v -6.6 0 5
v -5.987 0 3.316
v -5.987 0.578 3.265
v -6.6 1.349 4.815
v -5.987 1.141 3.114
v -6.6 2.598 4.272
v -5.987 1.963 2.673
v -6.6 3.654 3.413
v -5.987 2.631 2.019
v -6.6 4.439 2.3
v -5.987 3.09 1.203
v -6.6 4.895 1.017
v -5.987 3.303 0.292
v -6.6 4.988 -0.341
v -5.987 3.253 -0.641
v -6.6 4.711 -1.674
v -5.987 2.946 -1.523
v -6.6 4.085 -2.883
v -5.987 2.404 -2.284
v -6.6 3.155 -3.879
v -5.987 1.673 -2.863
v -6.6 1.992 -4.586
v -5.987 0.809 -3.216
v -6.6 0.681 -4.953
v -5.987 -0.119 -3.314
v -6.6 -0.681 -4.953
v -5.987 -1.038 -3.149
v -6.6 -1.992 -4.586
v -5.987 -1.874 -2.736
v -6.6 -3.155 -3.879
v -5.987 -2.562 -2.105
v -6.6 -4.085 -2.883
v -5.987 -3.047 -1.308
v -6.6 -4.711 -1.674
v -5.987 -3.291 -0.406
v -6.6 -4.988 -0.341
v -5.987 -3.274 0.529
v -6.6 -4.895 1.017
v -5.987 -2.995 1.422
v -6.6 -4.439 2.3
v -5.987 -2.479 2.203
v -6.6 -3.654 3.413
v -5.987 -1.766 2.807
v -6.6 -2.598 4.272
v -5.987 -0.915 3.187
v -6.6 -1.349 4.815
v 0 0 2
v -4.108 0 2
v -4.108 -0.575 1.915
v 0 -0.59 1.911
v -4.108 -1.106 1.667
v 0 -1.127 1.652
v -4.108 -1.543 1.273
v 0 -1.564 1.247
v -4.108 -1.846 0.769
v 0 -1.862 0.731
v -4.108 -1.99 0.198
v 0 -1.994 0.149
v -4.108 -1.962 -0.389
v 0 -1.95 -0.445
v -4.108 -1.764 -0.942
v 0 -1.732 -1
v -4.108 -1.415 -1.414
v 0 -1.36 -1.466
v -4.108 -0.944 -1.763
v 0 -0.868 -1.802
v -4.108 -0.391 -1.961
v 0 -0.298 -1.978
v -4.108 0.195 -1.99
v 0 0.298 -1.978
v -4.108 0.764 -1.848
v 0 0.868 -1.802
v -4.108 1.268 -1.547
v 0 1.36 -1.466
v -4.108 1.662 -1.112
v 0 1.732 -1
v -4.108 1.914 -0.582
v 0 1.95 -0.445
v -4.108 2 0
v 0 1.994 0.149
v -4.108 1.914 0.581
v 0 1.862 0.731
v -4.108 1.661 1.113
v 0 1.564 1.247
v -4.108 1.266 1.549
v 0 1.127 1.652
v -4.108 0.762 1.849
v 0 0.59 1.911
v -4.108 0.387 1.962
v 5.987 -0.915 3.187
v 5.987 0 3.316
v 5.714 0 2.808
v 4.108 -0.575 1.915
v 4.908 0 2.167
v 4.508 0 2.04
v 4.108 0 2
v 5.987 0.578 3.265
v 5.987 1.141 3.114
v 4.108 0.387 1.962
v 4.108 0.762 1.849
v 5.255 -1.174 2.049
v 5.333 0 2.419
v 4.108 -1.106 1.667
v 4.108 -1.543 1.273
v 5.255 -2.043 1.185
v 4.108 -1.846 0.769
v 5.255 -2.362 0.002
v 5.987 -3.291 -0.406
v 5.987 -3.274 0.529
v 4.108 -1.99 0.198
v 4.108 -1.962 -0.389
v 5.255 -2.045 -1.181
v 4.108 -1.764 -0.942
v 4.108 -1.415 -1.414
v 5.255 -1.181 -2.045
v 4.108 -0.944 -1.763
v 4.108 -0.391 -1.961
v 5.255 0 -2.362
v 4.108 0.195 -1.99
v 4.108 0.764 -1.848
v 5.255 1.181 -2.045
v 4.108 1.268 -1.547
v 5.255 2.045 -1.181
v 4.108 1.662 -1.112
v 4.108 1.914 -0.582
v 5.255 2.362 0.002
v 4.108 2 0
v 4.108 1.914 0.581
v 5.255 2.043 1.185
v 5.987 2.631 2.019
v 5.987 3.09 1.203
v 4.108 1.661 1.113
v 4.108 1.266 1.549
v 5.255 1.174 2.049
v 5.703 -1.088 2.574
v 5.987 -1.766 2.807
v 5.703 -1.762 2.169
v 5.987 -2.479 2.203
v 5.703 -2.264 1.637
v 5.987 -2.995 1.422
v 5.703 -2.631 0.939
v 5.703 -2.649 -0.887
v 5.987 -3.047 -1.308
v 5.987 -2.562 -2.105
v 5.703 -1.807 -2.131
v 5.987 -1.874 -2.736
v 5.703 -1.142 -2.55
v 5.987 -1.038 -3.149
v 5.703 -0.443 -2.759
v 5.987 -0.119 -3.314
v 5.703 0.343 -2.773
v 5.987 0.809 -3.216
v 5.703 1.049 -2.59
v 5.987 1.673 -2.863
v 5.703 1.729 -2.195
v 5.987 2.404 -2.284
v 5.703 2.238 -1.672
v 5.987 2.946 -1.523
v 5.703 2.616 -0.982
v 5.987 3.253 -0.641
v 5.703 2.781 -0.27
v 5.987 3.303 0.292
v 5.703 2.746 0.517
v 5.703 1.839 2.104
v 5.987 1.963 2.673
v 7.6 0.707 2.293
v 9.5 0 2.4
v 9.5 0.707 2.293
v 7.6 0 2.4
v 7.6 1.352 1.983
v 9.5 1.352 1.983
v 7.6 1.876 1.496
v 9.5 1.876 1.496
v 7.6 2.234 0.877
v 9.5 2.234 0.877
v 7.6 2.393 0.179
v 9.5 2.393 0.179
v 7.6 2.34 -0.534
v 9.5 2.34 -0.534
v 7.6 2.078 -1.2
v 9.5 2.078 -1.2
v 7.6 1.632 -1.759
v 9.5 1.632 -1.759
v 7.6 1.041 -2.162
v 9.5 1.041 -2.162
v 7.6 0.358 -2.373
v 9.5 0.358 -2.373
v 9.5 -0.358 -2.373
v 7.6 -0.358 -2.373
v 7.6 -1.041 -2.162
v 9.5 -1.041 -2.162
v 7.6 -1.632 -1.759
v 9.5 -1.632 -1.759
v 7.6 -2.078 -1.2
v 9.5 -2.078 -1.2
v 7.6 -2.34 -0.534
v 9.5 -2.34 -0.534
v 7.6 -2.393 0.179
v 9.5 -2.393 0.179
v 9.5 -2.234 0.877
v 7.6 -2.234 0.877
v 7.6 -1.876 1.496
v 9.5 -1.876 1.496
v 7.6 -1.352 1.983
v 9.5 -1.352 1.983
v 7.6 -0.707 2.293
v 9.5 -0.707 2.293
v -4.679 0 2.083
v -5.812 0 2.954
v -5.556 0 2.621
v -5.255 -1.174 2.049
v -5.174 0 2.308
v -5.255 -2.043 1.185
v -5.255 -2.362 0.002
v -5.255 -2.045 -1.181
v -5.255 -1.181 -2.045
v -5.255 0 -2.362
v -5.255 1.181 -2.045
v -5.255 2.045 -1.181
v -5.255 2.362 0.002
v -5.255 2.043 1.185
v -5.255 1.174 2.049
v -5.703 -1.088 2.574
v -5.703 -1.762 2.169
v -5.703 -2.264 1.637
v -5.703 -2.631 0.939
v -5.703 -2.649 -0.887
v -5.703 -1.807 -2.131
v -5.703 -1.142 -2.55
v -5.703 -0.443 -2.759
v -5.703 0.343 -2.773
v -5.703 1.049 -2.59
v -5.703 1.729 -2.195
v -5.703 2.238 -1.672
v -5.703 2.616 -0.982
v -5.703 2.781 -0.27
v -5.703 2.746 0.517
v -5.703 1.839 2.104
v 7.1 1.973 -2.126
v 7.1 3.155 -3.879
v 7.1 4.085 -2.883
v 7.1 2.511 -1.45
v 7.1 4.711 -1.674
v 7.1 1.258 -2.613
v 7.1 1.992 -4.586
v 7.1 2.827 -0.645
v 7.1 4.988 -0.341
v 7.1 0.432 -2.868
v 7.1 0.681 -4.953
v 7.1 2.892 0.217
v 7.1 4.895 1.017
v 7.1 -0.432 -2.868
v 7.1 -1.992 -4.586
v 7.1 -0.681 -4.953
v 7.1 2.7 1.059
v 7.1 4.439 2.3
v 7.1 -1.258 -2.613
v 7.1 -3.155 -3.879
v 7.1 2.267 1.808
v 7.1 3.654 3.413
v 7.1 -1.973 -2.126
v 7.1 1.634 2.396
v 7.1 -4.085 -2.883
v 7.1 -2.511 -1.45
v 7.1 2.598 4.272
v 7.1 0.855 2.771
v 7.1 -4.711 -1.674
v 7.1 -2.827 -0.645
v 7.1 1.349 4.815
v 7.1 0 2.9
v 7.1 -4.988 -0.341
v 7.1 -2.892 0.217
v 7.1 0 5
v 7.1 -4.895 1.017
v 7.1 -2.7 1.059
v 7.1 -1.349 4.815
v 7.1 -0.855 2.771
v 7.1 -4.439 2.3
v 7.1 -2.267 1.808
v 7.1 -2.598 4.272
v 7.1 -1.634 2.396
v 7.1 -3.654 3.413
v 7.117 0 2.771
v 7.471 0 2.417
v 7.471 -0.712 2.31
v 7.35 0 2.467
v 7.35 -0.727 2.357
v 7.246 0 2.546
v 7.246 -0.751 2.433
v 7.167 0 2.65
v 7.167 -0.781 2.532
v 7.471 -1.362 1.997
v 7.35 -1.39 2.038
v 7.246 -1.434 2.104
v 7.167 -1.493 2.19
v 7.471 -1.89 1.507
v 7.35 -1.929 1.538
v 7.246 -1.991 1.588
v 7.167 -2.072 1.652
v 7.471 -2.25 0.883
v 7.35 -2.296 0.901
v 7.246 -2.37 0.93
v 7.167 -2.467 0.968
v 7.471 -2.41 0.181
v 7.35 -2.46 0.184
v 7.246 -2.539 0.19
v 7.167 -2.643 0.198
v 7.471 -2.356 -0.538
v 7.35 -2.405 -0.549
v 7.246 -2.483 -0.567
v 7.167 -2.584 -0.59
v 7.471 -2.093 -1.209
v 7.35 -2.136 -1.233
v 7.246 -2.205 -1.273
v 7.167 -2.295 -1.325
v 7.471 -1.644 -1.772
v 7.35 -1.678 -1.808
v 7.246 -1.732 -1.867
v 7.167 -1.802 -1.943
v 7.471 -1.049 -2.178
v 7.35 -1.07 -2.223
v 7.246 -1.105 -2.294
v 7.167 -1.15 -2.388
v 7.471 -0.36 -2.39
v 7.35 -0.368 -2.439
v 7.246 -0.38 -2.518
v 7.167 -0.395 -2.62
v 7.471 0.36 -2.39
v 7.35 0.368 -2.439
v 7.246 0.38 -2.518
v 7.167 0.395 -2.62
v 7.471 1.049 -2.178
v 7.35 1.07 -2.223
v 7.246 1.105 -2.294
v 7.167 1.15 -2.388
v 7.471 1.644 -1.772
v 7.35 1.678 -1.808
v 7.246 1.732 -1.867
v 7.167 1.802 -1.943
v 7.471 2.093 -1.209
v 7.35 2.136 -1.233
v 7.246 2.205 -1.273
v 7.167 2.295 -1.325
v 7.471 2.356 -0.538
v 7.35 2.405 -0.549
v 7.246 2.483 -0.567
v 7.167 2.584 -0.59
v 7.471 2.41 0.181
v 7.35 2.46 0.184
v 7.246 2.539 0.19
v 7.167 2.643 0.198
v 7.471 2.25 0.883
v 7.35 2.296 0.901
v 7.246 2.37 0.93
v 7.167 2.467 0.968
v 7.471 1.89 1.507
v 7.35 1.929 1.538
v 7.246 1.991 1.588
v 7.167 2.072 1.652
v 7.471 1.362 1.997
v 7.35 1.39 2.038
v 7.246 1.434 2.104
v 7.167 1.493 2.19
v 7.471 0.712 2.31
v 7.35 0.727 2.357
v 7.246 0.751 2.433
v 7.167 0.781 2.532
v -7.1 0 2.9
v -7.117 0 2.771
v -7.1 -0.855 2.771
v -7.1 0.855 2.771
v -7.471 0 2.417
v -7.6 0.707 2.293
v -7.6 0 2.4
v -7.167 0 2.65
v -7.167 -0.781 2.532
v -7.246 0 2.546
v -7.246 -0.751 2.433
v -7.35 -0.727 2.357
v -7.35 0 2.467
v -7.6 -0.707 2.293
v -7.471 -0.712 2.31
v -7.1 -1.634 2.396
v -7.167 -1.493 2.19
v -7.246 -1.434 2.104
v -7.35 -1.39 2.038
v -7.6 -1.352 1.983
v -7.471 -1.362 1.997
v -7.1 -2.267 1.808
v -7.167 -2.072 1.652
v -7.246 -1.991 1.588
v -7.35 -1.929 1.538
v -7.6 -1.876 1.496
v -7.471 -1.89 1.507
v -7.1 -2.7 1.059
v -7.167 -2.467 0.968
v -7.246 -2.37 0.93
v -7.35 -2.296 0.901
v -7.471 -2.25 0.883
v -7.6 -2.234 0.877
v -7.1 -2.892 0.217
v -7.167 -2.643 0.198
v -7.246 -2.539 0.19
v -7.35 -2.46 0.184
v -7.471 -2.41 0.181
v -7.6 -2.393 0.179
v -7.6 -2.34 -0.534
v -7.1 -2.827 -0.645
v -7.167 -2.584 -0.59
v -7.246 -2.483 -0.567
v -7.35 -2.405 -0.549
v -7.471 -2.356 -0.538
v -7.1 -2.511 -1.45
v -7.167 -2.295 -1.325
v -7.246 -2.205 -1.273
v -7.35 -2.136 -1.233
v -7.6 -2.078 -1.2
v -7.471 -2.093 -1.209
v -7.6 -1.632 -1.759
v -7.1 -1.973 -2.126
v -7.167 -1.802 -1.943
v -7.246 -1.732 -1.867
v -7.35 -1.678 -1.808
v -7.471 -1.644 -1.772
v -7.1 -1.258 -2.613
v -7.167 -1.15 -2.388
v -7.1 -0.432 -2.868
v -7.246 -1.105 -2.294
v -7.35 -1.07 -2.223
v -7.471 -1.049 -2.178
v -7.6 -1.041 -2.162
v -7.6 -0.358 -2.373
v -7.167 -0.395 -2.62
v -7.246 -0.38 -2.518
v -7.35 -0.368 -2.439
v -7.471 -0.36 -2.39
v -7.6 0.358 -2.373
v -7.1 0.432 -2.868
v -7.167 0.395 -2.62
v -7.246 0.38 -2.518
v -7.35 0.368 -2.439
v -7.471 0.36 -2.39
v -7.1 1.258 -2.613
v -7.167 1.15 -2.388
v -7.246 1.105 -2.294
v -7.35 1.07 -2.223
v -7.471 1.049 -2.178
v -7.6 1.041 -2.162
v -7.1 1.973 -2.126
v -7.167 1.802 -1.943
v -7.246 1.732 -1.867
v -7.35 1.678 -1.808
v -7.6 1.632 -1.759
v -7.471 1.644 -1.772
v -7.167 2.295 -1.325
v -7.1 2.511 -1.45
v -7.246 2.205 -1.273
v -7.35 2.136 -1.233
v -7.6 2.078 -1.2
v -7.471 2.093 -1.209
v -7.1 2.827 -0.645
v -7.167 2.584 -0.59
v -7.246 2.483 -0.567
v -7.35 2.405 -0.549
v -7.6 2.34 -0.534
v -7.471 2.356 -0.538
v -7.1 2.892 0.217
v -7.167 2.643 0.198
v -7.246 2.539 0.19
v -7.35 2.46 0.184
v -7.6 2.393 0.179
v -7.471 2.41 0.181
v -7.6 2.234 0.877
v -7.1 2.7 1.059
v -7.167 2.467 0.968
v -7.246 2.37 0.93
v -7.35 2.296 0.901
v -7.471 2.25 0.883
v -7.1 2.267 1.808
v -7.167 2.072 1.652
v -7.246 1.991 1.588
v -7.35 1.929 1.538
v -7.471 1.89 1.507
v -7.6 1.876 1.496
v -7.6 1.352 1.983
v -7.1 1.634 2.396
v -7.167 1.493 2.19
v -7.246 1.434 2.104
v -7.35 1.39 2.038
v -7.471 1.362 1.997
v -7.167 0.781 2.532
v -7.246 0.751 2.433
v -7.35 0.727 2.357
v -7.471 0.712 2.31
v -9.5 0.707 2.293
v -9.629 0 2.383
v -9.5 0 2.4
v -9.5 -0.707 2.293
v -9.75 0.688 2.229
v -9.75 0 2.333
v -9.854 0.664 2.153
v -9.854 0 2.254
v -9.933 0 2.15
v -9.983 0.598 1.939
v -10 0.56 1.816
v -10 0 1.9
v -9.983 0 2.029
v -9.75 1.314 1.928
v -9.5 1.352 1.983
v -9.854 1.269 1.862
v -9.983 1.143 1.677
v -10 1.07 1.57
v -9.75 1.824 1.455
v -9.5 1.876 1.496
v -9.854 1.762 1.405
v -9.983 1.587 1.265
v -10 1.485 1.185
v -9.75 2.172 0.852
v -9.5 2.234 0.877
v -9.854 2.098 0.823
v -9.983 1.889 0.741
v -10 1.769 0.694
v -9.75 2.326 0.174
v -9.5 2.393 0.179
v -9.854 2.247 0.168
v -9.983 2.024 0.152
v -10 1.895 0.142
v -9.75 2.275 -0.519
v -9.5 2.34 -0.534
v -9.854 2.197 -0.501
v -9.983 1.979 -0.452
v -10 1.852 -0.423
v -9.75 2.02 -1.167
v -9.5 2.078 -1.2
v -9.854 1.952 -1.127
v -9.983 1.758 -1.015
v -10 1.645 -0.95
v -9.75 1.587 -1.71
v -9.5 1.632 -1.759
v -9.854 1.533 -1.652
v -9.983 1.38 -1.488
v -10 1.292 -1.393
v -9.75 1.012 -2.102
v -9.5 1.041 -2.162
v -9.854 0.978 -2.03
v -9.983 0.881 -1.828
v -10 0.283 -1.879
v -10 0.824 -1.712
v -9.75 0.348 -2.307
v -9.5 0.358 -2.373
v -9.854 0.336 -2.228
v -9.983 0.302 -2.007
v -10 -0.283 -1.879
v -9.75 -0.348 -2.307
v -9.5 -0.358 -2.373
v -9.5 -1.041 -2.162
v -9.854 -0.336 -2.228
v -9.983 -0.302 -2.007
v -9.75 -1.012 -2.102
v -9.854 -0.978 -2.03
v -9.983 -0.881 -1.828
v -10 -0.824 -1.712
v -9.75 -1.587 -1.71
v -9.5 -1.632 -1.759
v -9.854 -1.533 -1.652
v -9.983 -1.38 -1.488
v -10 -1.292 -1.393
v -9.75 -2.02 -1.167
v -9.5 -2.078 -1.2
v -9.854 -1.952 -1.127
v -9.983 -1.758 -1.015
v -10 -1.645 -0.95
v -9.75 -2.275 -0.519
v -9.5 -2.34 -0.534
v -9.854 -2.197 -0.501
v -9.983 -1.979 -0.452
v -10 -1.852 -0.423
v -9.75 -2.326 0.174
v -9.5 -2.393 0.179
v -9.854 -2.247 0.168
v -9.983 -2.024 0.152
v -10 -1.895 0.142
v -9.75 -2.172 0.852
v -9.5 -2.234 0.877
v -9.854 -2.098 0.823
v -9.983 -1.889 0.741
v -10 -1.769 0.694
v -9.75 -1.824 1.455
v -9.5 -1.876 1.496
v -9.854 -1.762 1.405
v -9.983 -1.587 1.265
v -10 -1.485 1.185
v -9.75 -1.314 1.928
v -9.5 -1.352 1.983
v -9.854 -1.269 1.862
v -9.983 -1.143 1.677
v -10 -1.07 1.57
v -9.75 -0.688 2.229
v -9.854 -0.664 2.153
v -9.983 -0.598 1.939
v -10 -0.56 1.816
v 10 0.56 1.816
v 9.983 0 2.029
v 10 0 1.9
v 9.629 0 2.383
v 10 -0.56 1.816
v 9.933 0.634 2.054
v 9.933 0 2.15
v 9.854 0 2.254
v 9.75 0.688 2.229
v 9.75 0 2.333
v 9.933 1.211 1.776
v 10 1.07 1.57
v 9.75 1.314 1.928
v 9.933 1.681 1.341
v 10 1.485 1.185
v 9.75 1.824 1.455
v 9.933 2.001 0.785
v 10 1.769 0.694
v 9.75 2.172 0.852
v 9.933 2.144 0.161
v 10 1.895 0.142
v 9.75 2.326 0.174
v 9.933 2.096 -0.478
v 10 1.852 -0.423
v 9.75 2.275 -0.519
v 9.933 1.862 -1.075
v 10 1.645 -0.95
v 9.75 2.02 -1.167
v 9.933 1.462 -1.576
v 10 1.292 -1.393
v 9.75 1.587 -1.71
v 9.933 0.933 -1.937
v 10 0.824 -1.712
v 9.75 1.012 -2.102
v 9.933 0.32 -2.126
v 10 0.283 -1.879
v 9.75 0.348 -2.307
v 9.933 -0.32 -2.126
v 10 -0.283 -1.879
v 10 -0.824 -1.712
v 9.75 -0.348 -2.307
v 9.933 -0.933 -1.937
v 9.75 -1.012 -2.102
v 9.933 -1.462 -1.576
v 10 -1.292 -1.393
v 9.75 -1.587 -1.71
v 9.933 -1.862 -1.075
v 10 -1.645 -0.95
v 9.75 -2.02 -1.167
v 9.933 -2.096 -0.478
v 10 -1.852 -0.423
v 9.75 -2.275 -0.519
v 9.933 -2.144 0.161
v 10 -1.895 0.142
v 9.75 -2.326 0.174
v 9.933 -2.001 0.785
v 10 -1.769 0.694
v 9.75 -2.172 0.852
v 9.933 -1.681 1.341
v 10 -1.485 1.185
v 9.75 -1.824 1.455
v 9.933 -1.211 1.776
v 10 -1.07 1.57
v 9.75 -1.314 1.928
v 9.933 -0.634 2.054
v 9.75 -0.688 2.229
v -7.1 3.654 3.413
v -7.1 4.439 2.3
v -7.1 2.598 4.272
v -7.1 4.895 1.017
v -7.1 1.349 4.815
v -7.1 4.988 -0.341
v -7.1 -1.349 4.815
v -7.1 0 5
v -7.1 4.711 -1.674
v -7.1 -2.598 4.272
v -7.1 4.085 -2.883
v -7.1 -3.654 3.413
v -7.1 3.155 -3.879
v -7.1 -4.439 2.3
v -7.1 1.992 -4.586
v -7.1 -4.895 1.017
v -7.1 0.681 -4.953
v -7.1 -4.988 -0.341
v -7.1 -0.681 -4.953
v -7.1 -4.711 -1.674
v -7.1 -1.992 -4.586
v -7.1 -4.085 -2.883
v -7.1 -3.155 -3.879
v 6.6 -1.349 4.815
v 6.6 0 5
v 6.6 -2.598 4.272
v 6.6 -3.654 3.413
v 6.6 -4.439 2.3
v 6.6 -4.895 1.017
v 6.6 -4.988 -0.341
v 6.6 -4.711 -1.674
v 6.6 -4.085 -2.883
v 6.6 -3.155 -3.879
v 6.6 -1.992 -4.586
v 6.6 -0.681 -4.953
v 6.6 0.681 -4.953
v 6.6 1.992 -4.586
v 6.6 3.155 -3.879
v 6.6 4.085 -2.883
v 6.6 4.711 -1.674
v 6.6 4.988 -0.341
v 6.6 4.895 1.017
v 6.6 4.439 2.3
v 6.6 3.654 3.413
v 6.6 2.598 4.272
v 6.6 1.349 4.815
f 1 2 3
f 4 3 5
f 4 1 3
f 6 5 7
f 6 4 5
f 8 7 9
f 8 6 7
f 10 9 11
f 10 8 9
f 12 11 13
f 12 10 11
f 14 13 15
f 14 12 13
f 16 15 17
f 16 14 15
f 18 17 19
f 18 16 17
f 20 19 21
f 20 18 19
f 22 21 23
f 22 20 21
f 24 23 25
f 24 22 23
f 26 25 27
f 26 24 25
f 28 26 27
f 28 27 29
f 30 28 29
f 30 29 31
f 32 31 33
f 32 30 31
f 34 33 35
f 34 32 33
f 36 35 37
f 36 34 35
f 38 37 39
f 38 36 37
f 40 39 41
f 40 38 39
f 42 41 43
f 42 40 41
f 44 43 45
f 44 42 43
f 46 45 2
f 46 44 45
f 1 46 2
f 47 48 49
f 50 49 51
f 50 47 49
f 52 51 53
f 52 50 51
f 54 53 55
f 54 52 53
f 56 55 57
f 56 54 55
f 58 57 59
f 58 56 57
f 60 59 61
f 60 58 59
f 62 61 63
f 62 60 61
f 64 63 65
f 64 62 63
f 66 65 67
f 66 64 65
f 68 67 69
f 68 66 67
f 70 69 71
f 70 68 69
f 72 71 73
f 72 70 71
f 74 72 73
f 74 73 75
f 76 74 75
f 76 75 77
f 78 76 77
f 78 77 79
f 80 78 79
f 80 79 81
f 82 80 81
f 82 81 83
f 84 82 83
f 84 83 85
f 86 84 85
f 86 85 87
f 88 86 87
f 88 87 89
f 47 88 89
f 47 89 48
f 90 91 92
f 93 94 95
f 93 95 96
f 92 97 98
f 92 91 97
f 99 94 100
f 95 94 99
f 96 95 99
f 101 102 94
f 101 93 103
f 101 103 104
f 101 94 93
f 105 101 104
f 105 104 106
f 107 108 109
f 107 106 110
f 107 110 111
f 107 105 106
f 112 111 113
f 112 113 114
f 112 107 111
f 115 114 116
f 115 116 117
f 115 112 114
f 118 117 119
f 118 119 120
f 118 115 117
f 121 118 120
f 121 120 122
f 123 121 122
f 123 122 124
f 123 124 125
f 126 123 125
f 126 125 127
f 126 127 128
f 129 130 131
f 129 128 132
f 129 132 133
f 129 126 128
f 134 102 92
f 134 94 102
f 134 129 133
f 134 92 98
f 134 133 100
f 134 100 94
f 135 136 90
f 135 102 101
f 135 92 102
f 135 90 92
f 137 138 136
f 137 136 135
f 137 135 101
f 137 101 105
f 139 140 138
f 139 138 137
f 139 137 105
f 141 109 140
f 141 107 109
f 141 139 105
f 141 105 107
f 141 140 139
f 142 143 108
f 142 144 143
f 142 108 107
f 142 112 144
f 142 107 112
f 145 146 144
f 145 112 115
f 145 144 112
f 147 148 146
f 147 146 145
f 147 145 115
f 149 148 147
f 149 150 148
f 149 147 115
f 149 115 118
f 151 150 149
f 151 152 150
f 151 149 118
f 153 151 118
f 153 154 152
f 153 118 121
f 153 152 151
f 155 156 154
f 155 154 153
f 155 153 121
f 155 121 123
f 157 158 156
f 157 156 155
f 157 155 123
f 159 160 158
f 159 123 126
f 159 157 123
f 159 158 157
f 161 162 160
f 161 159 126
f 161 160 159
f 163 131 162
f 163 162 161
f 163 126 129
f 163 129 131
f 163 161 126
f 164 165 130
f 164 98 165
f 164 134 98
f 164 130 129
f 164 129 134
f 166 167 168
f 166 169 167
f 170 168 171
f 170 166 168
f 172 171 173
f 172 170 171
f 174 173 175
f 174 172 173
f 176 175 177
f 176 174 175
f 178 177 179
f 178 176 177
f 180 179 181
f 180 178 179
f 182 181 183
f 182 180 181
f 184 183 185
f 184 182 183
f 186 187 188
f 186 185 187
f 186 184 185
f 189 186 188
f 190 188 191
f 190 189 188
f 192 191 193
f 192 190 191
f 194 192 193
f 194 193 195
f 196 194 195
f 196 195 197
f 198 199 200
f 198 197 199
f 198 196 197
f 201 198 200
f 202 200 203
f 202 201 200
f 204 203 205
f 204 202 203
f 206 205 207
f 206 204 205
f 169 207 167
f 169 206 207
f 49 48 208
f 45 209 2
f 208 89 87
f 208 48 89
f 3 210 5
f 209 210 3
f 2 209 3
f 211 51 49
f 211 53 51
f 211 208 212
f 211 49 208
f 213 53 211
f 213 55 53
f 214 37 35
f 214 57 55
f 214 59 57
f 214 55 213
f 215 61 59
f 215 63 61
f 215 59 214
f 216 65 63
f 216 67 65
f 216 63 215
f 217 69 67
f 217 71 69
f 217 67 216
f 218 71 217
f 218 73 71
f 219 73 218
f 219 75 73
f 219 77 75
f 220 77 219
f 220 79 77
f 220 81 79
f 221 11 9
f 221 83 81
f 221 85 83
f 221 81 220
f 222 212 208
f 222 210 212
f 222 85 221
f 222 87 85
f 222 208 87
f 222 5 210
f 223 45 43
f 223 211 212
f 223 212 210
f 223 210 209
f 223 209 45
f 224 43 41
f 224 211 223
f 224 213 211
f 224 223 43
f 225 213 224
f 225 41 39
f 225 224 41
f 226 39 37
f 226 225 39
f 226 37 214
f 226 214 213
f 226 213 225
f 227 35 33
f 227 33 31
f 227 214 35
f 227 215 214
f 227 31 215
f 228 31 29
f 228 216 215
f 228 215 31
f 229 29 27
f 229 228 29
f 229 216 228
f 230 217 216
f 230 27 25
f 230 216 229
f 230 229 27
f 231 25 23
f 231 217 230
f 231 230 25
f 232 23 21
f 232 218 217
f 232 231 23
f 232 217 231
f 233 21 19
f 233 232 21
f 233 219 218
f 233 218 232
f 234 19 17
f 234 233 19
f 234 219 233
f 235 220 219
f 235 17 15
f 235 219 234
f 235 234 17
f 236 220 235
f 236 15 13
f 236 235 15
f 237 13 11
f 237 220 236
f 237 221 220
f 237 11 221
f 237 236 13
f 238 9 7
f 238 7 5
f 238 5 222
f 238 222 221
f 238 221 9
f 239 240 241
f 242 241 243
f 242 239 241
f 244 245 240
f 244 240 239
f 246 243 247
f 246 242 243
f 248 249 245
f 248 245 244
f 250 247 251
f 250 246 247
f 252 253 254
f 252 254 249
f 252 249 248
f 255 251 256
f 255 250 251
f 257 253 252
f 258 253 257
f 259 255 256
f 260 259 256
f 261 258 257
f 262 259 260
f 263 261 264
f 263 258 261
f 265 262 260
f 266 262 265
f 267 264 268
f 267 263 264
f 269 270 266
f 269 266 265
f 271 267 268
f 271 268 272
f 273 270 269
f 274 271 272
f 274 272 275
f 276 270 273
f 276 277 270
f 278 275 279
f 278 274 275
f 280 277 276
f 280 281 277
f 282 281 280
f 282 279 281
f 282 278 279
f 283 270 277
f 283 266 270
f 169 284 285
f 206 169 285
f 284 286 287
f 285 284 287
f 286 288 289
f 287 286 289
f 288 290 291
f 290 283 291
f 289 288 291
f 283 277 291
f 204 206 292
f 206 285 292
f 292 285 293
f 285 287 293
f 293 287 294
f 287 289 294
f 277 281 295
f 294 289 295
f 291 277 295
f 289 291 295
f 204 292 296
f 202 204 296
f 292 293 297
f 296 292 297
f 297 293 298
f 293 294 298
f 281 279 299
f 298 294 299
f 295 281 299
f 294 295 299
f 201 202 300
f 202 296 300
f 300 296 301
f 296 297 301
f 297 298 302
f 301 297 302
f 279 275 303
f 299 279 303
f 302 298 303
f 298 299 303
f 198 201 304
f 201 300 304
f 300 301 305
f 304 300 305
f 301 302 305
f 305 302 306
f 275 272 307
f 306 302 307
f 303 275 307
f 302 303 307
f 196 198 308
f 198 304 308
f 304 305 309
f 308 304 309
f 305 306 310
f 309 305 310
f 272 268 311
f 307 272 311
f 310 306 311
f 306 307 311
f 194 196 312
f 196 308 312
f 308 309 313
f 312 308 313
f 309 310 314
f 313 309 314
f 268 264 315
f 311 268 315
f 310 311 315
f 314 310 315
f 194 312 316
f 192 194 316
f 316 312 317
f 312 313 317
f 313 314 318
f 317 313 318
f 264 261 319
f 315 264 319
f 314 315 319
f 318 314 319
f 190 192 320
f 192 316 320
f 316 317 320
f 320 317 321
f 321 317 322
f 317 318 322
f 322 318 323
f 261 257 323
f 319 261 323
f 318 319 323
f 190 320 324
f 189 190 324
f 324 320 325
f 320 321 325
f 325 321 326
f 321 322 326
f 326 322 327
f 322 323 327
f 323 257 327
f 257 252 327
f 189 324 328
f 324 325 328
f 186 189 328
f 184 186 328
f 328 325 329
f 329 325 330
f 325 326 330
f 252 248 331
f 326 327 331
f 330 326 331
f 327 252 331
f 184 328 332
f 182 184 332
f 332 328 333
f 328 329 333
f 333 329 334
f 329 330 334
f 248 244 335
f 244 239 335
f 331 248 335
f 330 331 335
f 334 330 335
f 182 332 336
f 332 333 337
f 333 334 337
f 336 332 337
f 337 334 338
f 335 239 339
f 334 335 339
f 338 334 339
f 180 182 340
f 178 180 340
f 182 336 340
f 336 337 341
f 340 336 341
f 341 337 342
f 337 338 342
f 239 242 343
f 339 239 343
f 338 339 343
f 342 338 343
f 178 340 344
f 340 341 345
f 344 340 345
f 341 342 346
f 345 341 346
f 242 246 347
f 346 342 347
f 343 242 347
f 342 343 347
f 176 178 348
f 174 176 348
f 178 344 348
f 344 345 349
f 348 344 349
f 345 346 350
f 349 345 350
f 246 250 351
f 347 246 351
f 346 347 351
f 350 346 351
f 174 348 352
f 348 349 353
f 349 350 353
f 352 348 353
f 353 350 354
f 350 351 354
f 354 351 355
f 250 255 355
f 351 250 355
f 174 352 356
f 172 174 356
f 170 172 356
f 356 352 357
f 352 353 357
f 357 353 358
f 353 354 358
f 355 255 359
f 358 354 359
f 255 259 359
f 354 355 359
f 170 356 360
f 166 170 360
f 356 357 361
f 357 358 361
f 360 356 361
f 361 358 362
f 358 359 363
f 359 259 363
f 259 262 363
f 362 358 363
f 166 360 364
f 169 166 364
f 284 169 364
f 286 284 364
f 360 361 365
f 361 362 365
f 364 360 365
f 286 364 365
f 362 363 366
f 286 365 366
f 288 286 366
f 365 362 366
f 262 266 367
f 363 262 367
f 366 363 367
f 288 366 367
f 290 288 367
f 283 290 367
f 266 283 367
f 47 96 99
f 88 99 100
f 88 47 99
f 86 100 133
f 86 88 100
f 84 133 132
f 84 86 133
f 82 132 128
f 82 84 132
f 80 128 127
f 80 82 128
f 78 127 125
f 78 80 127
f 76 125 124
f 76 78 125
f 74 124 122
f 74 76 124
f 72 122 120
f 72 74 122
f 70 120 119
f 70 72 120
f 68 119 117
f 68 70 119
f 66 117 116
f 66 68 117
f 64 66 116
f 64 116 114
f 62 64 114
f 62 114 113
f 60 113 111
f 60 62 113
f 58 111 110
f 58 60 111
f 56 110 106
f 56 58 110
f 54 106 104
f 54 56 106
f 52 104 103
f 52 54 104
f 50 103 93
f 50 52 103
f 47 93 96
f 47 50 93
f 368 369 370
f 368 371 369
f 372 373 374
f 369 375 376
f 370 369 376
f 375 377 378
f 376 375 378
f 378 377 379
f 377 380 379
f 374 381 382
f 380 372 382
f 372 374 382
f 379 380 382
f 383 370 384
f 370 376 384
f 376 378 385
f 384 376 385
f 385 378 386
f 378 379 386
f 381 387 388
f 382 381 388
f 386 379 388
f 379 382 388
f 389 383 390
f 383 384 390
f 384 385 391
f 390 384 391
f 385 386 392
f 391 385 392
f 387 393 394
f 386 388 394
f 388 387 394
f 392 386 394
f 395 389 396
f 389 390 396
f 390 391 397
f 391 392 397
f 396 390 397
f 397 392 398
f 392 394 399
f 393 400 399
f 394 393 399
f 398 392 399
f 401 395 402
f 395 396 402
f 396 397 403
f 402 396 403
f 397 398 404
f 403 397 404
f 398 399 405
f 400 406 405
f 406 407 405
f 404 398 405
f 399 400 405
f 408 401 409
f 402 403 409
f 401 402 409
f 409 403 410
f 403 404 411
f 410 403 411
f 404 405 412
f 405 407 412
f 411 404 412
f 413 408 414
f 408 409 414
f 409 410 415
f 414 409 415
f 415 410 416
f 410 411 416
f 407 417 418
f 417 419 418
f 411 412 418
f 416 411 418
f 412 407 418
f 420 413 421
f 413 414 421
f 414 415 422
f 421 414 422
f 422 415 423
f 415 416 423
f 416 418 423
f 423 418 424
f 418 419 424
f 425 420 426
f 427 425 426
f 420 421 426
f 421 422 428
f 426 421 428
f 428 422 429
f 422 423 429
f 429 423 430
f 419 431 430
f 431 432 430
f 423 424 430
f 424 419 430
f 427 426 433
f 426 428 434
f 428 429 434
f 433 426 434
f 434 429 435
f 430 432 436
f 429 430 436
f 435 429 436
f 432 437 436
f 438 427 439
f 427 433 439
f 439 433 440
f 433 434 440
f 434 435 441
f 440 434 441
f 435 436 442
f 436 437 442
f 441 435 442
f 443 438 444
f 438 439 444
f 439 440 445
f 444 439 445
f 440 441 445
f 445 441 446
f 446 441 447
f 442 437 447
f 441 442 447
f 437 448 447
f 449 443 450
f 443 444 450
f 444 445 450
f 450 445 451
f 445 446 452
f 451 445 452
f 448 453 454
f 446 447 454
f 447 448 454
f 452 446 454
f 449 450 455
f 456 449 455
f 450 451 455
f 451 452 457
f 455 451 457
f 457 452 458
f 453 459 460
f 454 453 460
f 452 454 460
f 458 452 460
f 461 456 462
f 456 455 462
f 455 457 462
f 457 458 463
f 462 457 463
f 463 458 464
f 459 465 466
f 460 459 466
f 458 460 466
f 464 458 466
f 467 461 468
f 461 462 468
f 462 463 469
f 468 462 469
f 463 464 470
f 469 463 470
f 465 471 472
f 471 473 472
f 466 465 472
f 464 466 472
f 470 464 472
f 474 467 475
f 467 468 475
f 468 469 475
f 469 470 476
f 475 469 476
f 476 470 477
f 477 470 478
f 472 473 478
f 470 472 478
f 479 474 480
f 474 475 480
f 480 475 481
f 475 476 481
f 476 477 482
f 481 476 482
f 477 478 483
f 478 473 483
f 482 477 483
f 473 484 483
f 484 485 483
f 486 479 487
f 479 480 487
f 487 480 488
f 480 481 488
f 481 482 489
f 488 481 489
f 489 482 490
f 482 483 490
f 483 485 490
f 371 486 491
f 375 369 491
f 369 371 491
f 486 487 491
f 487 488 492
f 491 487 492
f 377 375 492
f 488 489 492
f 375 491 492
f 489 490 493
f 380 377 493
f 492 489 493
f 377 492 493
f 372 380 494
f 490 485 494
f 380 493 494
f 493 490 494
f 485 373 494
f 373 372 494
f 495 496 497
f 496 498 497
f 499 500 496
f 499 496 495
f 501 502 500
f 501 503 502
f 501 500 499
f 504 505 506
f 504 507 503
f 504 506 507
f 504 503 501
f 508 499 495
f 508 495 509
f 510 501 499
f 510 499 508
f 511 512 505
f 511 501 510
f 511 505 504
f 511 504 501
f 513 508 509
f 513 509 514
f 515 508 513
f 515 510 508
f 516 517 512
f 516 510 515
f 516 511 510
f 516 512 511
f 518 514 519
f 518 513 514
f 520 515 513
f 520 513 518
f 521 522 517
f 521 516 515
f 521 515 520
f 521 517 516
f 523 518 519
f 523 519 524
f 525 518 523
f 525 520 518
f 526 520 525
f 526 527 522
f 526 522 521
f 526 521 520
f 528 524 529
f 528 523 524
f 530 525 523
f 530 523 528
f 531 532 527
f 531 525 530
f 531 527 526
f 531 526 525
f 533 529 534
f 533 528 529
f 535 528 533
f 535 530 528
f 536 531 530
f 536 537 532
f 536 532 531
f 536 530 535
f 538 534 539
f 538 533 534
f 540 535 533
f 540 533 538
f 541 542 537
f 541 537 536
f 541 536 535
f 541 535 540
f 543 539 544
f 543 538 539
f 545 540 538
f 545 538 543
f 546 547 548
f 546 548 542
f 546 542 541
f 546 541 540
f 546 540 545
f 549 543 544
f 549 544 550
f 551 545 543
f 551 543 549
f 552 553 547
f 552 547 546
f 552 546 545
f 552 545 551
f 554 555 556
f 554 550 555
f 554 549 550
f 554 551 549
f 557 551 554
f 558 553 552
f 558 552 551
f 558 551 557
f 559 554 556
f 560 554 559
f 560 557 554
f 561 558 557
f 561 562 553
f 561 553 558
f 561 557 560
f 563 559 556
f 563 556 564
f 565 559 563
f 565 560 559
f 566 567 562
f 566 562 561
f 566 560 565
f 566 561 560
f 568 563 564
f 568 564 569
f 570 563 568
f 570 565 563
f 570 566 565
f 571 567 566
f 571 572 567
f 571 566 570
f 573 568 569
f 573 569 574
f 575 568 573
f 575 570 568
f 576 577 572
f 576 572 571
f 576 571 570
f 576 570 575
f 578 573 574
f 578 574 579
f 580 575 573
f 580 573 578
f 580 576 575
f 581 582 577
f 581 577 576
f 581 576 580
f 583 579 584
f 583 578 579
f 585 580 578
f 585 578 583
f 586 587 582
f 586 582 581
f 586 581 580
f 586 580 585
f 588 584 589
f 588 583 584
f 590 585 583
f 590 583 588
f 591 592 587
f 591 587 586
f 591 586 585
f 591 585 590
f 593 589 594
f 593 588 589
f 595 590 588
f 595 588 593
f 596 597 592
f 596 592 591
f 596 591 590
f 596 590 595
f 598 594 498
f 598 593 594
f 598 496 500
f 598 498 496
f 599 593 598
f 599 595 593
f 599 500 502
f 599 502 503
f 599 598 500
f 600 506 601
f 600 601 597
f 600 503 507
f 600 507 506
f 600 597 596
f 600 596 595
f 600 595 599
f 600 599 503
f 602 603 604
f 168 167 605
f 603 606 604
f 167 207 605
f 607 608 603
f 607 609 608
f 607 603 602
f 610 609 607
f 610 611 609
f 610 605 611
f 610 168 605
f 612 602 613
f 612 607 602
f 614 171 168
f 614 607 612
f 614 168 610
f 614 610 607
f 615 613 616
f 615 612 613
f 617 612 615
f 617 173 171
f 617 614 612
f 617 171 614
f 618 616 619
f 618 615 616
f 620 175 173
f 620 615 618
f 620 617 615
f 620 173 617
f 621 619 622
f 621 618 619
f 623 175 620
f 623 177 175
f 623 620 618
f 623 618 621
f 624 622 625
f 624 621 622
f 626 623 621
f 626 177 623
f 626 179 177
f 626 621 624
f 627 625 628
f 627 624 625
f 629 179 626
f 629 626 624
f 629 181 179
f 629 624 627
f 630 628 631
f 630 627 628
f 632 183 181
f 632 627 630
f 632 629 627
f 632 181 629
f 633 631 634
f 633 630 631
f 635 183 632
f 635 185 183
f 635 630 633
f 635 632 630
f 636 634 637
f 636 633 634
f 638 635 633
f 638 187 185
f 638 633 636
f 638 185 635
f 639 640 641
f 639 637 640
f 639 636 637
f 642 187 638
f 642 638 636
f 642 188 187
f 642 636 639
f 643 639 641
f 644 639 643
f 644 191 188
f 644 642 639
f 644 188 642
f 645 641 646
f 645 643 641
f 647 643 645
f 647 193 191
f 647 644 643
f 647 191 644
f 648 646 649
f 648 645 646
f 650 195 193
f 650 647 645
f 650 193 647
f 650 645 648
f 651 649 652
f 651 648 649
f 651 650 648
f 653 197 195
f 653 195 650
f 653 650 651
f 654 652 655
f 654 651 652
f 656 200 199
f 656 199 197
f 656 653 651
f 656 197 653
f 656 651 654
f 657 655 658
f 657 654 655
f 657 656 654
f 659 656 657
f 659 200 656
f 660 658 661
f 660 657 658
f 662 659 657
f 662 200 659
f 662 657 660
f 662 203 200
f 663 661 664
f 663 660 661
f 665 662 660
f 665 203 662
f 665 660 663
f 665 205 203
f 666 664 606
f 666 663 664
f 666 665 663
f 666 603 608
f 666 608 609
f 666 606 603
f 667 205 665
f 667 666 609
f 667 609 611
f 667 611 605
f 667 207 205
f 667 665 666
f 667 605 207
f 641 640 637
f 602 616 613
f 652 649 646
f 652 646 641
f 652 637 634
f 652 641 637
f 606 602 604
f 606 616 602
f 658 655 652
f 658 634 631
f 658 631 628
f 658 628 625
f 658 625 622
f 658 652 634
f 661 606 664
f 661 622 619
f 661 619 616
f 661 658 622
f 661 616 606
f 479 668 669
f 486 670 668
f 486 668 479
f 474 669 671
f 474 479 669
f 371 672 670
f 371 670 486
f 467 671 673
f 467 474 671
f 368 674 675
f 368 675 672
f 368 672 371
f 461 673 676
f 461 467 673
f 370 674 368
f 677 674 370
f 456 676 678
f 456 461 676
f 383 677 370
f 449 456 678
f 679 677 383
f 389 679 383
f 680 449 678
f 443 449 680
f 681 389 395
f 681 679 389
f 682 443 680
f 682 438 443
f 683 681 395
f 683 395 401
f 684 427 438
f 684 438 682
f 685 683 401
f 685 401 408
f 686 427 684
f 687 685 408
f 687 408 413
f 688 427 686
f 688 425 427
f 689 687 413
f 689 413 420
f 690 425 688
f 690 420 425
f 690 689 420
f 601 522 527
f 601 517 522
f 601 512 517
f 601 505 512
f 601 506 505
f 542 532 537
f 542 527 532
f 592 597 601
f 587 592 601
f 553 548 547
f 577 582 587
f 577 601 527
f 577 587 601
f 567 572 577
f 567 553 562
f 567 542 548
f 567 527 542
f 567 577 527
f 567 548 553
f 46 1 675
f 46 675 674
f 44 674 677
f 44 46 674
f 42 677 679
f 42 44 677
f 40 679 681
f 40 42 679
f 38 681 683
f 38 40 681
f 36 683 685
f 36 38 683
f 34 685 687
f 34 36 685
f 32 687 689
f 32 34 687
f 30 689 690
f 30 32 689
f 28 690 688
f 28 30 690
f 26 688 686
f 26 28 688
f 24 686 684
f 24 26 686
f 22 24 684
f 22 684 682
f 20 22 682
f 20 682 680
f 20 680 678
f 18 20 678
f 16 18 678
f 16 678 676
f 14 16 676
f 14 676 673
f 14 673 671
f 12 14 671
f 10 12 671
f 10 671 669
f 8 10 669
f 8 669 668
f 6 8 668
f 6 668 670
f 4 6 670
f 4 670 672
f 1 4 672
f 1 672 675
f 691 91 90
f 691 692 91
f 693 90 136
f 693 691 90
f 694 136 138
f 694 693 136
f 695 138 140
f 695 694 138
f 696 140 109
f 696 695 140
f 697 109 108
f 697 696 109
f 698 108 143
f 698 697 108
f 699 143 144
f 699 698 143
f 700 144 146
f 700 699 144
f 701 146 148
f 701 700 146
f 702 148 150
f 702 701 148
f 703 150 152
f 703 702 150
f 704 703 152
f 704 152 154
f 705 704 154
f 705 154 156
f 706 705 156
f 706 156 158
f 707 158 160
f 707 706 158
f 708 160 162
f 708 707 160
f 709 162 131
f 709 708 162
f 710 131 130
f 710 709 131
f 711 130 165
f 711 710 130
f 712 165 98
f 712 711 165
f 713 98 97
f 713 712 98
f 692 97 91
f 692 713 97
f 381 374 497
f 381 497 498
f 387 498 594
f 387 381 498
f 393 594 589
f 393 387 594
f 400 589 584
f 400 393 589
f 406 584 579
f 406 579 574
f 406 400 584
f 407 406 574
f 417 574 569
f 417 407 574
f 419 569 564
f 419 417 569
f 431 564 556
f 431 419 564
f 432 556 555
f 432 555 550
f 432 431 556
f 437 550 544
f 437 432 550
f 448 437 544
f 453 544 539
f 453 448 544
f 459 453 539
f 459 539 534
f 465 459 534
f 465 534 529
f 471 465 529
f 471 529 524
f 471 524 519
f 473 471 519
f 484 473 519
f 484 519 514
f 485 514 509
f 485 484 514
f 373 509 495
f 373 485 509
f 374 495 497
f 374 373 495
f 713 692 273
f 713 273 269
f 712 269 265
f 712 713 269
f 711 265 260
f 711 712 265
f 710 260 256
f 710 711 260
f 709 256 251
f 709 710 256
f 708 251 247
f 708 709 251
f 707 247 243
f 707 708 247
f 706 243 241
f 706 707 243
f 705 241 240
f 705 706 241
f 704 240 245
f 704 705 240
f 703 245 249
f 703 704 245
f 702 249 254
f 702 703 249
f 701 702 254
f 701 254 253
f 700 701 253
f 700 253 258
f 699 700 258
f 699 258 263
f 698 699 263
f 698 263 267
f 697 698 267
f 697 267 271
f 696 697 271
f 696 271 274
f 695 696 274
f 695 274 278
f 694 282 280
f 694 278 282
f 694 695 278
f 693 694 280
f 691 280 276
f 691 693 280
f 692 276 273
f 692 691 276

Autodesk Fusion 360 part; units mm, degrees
sketch "Sketch1" plane through (0, 0, 0) normal (0, 1, 0) x (1, 0, 0)
  line L0 (0, 0) -> (10, 0)
  line L1 (10, 0) -> (10, -2.4)
  line L2 (10, -2.4) -> (7.1, -2.4)
  line L3 (7.1, -2.4) -> (7.1, -5)
  line L4 (7.1, -5) -> (6.6, -5)
  line L5 (6.6, -5) -> (5.5081, -2)
  line L6 (5.5081, -2) -> (0, -2)
  line L7 (0, -2) -> (0, 0)
  dimension "d1" = 2.4
  dimension "d6" = 0.5
  dimension "d7" = 2
  dimension "d8" = 5
  dimension "d9" = 2.9
  dimension "d13" = 110
  dimension "d14" = 10
revolve "Revolve1" add sketch "Sketch1" angle 360 about axis through (0, 0, 0) along (1, 0, 0)
mirror "Mirror1" about plane through (0, 0, 0) normal (-1, 0, 0) of bodies 1 merged
fillet "Fillet2" radius 0.5 4 edges at (-7.1, -0.8679, -2.2376) (7.1, -0.8679, -2.2376) (10, -0.8679, -2.2376) (-10, -0.8679, -2.2376)
fillet "Fillet2" radius 2 2 edges at (5.5081, -0.7232, -1.8647) (-5.5081, -0.7232, -1.8647)
